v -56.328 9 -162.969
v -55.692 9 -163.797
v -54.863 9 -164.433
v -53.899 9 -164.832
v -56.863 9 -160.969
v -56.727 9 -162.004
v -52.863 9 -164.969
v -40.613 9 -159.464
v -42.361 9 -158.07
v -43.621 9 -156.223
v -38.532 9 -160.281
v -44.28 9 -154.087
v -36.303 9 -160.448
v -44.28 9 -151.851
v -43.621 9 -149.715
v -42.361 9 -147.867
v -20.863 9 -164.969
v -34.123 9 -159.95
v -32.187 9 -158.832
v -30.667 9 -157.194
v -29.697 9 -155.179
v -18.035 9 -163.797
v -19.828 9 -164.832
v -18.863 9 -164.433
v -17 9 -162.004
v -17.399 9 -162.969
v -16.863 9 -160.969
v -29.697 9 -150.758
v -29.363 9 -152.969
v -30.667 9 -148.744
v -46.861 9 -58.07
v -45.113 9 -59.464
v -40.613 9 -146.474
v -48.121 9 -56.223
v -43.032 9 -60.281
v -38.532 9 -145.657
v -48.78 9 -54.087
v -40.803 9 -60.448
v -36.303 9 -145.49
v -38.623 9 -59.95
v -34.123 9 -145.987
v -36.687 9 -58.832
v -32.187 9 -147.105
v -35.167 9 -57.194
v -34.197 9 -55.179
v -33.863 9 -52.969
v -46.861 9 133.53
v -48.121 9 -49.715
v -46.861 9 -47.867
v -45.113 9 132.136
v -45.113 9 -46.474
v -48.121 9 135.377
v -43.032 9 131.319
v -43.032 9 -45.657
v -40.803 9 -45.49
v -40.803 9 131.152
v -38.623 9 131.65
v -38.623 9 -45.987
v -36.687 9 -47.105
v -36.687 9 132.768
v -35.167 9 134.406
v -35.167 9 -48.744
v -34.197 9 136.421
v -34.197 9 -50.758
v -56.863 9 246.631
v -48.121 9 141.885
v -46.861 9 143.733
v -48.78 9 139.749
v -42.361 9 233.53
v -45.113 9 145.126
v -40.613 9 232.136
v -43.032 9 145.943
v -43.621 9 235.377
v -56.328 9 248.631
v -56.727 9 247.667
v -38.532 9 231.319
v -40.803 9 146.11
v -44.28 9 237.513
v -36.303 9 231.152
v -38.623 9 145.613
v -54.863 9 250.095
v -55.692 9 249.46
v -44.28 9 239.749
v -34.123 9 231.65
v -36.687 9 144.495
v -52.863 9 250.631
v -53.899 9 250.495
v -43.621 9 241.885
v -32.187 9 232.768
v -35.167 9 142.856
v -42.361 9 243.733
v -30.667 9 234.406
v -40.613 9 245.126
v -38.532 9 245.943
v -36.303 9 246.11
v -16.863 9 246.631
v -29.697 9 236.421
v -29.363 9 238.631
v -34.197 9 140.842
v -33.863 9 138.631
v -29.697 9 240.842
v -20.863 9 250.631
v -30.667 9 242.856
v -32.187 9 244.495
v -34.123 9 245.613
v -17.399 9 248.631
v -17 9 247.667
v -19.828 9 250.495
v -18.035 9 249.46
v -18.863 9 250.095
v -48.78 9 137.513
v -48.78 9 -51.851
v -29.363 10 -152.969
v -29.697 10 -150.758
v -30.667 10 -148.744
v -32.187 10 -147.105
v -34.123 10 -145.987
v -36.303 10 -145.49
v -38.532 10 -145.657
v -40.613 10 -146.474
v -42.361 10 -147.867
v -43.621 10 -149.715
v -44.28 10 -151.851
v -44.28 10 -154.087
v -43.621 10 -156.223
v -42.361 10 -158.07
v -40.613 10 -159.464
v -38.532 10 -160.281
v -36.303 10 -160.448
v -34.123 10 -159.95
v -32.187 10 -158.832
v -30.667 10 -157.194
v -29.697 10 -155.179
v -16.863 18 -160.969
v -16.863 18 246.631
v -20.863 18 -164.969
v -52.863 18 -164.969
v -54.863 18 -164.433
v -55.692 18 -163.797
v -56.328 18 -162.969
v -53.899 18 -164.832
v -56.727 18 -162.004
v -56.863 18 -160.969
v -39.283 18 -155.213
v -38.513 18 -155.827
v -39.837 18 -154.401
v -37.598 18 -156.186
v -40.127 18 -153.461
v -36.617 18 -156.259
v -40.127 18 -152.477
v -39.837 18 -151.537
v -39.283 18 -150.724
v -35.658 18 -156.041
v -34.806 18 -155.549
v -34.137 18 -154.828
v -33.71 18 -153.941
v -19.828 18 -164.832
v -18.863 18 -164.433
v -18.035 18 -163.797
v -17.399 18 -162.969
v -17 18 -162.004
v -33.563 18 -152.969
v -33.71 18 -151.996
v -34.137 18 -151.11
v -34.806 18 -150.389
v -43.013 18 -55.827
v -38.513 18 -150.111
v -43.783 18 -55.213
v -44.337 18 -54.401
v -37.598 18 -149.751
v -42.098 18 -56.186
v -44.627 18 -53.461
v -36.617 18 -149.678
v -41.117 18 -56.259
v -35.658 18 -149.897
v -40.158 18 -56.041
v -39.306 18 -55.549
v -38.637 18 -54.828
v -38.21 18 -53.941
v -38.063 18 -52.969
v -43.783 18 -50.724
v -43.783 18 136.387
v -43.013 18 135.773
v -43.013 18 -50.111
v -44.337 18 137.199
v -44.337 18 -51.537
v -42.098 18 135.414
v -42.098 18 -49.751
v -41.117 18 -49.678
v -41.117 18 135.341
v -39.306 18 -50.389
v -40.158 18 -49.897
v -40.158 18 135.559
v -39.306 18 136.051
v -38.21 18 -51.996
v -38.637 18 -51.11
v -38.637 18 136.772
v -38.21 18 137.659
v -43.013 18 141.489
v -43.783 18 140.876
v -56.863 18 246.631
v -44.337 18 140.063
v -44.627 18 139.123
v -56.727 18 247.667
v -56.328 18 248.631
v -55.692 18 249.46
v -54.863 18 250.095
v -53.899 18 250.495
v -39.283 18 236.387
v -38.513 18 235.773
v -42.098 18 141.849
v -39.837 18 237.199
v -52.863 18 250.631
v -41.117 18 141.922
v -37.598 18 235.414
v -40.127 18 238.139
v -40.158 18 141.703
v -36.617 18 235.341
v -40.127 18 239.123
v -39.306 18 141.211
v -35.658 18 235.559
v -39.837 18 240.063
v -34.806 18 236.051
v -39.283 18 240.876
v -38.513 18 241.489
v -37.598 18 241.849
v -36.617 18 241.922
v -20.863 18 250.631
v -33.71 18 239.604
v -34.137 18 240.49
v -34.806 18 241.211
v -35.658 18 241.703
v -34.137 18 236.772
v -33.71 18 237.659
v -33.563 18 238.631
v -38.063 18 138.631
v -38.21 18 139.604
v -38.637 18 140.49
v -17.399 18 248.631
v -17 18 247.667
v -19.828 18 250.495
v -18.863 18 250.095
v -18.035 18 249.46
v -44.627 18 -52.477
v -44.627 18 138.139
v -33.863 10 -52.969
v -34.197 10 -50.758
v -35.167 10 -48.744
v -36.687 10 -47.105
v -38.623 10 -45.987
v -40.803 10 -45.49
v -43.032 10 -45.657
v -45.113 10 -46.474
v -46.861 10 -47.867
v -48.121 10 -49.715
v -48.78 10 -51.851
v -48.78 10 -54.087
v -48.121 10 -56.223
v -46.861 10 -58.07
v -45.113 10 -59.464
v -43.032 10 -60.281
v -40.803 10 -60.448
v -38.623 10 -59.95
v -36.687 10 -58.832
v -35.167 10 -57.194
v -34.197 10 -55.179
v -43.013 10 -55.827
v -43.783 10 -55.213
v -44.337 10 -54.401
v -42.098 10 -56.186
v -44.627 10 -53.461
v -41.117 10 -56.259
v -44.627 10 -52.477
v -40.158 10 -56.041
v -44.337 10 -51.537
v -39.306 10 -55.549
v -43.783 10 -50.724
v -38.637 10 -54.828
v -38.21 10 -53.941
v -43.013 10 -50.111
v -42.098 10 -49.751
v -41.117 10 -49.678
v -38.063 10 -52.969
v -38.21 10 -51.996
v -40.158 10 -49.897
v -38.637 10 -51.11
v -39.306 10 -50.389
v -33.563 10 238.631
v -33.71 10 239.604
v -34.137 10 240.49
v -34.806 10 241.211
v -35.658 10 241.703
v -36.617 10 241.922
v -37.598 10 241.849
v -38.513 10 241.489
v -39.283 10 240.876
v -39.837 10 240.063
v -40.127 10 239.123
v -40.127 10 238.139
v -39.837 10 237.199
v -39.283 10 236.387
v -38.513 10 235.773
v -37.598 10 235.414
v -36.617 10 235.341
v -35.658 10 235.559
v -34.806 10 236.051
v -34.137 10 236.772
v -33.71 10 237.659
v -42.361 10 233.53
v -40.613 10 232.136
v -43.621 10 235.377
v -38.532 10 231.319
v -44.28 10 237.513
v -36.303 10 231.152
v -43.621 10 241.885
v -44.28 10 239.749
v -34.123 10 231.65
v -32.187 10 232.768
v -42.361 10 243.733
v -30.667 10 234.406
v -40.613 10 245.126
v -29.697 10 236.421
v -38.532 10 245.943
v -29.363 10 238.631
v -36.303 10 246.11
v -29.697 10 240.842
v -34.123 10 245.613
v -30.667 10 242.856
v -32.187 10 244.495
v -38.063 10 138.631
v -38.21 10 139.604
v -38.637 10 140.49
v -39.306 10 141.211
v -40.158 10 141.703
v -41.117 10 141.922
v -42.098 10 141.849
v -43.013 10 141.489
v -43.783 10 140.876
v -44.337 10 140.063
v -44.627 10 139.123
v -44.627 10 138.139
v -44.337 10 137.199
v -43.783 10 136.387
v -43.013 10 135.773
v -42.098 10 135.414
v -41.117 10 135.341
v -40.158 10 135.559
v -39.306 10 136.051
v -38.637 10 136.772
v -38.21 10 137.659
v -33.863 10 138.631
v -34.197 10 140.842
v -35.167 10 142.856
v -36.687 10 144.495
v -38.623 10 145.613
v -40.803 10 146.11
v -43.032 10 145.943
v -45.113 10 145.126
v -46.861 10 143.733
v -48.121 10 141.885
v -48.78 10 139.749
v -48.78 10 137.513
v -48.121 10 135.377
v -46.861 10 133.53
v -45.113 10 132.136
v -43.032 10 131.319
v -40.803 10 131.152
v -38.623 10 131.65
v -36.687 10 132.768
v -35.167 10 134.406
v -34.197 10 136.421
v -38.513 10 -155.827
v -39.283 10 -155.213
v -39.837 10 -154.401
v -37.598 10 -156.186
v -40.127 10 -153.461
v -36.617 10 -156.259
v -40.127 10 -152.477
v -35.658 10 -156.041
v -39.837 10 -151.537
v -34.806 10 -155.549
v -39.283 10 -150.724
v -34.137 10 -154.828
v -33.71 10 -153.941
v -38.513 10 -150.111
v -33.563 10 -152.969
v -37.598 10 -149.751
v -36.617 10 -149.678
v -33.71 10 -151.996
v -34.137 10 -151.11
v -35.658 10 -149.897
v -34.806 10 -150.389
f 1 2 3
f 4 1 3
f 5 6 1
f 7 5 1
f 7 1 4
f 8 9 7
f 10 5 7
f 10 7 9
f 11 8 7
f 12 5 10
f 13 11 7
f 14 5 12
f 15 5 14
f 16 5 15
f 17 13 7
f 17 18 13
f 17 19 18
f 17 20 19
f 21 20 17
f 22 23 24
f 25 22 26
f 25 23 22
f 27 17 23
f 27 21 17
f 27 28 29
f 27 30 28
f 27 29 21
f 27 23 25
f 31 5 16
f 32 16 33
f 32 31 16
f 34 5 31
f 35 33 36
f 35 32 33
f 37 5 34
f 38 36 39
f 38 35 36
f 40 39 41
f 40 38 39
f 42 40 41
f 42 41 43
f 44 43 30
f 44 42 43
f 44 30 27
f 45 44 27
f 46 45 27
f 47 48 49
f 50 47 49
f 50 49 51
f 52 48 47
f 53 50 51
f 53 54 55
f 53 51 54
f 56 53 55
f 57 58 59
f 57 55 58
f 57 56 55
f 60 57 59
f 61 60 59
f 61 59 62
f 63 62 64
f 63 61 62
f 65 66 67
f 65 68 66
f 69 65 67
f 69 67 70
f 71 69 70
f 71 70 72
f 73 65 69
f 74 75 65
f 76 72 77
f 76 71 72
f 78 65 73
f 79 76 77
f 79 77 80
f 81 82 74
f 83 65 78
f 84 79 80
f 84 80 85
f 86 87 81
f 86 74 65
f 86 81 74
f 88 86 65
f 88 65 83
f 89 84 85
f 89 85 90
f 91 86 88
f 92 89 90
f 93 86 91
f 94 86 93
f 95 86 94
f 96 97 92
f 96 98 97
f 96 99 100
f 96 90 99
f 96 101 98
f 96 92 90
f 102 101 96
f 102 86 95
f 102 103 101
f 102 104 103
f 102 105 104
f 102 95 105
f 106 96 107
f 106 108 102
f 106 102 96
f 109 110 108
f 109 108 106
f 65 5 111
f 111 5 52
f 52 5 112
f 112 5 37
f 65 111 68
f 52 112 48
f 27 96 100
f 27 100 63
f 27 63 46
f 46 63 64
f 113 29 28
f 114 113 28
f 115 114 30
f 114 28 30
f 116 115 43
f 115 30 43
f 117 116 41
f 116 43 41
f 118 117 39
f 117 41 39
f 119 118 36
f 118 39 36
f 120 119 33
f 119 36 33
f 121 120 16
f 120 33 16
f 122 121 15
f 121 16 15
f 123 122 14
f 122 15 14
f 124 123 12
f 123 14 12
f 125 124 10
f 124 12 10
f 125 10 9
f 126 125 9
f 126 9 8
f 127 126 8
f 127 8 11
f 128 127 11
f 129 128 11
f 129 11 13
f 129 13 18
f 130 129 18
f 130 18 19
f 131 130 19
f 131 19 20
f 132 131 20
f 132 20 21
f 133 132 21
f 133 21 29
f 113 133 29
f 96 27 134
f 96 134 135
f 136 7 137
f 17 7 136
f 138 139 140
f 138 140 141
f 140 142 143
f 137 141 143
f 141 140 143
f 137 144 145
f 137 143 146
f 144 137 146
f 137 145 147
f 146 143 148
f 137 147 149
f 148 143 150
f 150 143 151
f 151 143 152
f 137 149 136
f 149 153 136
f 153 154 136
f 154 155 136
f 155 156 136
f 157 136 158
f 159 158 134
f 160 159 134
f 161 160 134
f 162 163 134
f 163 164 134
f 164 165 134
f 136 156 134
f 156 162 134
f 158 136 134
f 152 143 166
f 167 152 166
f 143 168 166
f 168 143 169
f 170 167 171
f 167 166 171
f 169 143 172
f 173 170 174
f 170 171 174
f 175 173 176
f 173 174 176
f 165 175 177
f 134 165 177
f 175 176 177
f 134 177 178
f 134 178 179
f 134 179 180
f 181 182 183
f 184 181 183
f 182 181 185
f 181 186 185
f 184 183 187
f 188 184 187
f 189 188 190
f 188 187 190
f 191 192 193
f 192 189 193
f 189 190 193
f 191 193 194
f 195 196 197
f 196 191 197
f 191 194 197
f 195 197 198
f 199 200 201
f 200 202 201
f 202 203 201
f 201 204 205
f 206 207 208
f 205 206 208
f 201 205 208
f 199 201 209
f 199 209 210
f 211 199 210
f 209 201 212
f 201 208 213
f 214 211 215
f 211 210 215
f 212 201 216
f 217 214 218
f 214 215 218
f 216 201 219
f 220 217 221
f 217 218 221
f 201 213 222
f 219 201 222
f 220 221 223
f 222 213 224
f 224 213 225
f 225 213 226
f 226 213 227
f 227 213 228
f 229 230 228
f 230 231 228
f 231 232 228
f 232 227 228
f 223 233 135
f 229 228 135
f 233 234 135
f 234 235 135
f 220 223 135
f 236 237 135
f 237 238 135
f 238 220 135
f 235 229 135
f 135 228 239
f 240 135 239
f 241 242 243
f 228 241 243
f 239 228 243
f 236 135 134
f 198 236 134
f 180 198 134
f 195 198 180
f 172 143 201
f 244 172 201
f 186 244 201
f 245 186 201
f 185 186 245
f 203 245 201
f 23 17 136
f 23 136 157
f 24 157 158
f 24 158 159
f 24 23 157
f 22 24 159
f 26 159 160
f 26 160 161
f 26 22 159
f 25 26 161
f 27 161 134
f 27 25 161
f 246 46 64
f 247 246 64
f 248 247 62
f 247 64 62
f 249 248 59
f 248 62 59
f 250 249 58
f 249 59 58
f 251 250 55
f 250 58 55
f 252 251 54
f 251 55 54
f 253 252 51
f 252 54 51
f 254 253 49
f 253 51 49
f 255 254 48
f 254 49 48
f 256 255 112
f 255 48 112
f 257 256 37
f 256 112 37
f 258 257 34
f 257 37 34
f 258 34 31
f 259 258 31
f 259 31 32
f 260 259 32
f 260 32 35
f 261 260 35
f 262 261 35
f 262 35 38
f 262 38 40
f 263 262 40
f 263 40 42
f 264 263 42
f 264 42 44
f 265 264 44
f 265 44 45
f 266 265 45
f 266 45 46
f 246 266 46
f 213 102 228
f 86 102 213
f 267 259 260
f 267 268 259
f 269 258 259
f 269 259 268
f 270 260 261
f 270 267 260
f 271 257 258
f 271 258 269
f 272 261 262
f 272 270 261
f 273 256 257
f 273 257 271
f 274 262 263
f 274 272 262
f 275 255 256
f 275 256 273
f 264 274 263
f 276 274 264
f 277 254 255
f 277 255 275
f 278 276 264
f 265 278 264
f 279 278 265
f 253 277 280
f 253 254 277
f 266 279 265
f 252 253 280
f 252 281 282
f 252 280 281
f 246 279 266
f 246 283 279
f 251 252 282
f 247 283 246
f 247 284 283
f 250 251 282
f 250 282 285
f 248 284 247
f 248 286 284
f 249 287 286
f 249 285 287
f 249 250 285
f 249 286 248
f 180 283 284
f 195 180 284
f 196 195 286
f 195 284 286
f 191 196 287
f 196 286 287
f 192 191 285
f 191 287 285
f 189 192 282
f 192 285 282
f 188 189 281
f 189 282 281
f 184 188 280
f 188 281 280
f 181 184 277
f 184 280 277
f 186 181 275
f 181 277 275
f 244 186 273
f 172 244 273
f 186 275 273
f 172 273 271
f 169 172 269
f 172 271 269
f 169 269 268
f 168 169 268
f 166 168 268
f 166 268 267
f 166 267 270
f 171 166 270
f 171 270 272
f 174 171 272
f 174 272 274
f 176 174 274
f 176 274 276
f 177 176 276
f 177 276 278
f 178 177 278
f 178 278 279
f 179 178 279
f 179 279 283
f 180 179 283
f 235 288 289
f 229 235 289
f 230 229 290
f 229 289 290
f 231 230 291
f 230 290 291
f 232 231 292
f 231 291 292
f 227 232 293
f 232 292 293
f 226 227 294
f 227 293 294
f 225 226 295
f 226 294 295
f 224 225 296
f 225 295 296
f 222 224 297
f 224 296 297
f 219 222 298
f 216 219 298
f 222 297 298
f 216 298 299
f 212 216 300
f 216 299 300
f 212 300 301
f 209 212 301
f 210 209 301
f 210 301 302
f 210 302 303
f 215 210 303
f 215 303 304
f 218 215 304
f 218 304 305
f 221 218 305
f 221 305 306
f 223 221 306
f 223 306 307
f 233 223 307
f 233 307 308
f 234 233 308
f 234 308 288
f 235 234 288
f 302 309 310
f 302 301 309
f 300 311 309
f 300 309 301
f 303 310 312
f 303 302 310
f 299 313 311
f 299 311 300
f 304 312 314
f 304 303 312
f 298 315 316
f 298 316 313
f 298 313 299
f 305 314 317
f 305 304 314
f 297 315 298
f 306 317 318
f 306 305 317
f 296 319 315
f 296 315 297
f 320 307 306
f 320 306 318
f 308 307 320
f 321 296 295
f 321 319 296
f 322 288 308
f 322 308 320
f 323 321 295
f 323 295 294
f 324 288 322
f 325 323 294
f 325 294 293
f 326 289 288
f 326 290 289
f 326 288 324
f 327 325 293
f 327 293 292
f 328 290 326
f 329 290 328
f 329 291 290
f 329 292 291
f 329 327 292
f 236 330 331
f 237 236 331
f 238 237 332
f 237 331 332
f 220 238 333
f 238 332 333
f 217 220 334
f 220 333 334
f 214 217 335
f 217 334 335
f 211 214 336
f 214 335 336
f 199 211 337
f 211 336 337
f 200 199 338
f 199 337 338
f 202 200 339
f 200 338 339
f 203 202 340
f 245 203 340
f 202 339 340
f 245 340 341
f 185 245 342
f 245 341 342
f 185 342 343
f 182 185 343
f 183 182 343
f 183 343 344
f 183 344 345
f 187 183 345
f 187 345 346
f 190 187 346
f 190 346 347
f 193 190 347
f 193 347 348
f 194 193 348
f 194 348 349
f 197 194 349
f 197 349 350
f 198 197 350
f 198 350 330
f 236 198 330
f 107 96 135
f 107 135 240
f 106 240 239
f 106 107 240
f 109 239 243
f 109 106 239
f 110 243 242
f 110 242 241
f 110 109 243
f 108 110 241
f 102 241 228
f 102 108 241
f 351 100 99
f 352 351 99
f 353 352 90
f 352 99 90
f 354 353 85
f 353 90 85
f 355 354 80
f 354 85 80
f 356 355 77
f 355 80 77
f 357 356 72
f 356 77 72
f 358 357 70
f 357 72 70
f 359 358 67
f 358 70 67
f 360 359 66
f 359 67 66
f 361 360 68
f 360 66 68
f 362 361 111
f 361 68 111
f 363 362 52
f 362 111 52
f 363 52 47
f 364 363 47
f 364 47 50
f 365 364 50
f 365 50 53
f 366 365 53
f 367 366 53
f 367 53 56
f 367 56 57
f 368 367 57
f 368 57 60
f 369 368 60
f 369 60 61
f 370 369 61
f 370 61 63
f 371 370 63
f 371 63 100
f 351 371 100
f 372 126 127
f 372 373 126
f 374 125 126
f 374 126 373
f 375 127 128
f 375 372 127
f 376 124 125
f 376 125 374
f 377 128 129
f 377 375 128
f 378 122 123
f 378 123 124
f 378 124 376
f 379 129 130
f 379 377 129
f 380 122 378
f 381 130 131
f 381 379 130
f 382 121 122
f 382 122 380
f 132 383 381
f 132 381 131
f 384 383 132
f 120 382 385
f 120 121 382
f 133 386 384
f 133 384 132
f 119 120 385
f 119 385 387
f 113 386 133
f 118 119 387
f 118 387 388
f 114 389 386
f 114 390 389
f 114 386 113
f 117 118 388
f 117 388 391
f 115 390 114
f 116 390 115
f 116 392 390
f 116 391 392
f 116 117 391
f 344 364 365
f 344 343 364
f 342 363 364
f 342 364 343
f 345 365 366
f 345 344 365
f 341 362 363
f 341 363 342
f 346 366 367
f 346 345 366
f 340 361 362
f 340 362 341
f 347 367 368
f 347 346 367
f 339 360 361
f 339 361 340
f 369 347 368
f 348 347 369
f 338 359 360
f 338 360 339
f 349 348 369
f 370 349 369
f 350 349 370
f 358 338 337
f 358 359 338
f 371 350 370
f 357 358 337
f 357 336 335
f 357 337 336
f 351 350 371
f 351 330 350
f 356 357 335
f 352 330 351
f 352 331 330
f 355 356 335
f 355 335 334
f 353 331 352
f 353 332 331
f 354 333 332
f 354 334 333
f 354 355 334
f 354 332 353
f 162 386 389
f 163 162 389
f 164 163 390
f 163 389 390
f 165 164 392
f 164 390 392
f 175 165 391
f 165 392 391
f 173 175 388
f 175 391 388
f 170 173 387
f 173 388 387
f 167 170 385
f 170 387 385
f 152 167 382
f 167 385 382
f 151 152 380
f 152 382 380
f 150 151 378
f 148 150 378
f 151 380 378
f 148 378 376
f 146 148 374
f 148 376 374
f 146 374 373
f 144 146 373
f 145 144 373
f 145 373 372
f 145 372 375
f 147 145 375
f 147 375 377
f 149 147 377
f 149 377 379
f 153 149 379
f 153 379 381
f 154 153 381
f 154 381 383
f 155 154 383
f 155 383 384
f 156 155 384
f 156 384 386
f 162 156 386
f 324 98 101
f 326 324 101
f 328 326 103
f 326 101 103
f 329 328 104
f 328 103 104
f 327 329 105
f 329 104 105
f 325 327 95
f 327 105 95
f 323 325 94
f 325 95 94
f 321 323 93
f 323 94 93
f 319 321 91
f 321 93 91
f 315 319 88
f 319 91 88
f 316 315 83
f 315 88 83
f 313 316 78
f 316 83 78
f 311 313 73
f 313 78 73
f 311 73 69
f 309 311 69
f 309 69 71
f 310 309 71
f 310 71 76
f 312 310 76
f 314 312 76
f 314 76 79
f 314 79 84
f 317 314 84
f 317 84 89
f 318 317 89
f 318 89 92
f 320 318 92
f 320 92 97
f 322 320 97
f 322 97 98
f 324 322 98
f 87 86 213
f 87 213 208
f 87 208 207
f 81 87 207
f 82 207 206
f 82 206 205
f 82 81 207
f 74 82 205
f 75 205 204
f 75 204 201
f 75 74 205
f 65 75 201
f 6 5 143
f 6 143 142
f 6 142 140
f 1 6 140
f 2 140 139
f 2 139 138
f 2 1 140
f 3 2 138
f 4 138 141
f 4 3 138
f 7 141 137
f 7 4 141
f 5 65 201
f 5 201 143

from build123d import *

# Parameters (mm, degrees)
F0_R     = 7.5
F0_R_2   = 3.3
F1_DEPTH = 18
F2_DEPTH = 9
F3_DEPTH = 10


with BuildPart() as f1:
    # F0 (on Front) → F1 (new body)
    with BuildSketch(Plane.XZ):
        with BuildLine():
            ThreePointArc((-56.863438, -160.968715), (-55.691865, -163.797142), (-52.863438, -164.968715))
            Line((-52.863438, -164.968715), (-20.863438, -164.968715))
            ThreePointArc((-20.863438, -164.968715), (-18.035011, -163.797142), (-16.863438, -160.968715))
            Line((-16.863438, -160.968715), (-16.863438, 246.631285))
            ThreePointArc((-16.863438, 246.631285), (-18.035011, 249.459712), (-20.863438, 250.631285))
            Line((-20.863438, 250.631285), (-52.863438, 250.631285))
            ThreePointArc((-52.863438, 250.631285), (-55.691865, 249.459712), (-56.863438, 246.631285))
            Line((-56.863438, 246.631285), (-56.863438, -160.968715))
        make_face()
        with Locations((-36.863438, -152.968715)):
            Circle(F0_R, mode=Mode.SUBTRACT)
        with Locations((-41.363438, -52.968715)):
            Circle(F0_R, mode=Mode.SUBTRACT)
        with Locations((-41.363438, 138.631285)):
            Circle(F0_R, mode=Mode.SUBTRACT)
        with Locations((-36.863438, 238.631285)):
            Circle(F0_R, mode=Mode.SUBTRACT)
        with Locations((-36.863438, 238.631285)):
            Circle(F0_R)
        with Locations((-36.863438, 238.631285)):
            Circle(F0_R_2, mode=Mode.SUBTRACT)
        with Locations((-41.363438, 138.631285)):
            Circle(F0_R)
        with Locations((-41.363438, 138.631285)):
            Circle(F0_R_2, mode=Mode.SUBTRACT)
        with Locations((-41.363438, -52.968715)):
            Circle(F0_R)
        with Locations((-41.363438, -52.968715)):
            Circle(F0_R_2, mode=Mode.SUBTRACT)
        with Locations((-36.863438, -152.968715)):
            Circle(F0_R)
        with Locations((-36.863438, -152.968715)):
            Circle(F0_R_2, mode=Mode.SUBTRACT)
    extrude(amount=-F1_DEPTH)

    # F0 (on Front) → F2 (cut)
    with BuildSketch(Plane.XZ):
        with BuildLine():
            Line((-6.144915, -161.370628), (-6.144915, 246.229372))
            ThreePointArc((-6.144915, 246.229372), (-10.24542, 256.128867), (-20.144915, 260.229372))
            Line((-20.144915, 260.229372), (-52.144915, 260.229372))
            ThreePointArc((-52.144915, 260.229372), (-62.04441, 256.128867), (-66.144915, 246.229372))
            Line((-66.144915, 246.229372), (-66.144915, -161.370628))
            ThreePointArc((-66.144915, -161.370628), (-62.04441, -171.270123), (-52.144915, -175.370628))
            Line((-52.144915, -175.370628), (-20.144915, -175.370628))
            ThreePointArc((-20.144915, -175.370628), (-10.24542, -171.270123), (-6.144915, -161.370628))
        make_face()
        with BuildLine():
            Line((-20.863438, -164.968715), (-52.863438, -164.968715))
            ThreePointArc((-52.863438, -164.968715), (-55.691865, -163.797142), (-56.863438, -160.968715))
            Line((-56.863438, -160.968715), (-56.863438, 246.631285))
            ThreePointArc((-56.863438, 246.631285), (-55.691865, 249.459712), (-52.863438, 250.631285))
            Line((-52.863438, 250.631285), (-20.863438, 250.631285))
            ThreePointArc((-20.863438, 250.631285), (-18.035011, 249.459712), (-16.863438, 246.631285))
            Line((-16.863438, 246.631285), (-16.863438, -160.968715))
            ThreePointArc((-16.863438, -160.968715), (-18.035011, -163.797142), (-20.863438, -164.968715))
        make_face(mode=Mode.SUBTRACT)
        with Locations((-36.863438, 238.631285)):
            Circle(F0_R_2)
        with Locations((-41.363438, 138.631285)):
            Circle(F0_R)
        with Locations((-41.363438, 138.631285)):
            Circle(F0_R_2, mode=Mode.SUBTRACT)
        with Locations((-41.363438, 138.631285)):
            Circle(F0_R_2)
        with Locations((-41.363438, -52.968715)):
            Circle(F0_R)
        with Locations((-41.363438, -52.968715)):
            Circle(F0_R_2, mode=Mode.SUBTRACT)
        with Locations((-41.363438, -52.968715)):
            Circle(F0_R_2)
        with Locations((-36.863438, 238.631285)):
            Circle(F0_R)
        with Locations((-36.863438, 238.631285)):
            Circle(F0_R_2, mode=Mode.SUBTRACT)
        with BuildLine():
            ThreePointArc((-56.863438, -160.968715), (-55.691865, -163.797142), (-52.863438, -164.968715))
            Line((-52.863438, -164.968715), (-20.863438, -164.968715))
            ThreePointArc((-20.863438, -164.968715), (-18.035011, -163.797142), (-16.863438, -160.968715))
            Line((-16.863438, -160.968715), (-16.863438, 246.631285))
            ThreePointArc((-16.863438, 246.631285), (-18.035011, 249.459712), (-20.863438, 250.631285))
            Line((-20.863438, 250.631285), (-52.863438, 250.631285))
            ThreePointArc((-52.863438, 250.631285), (-55.691865, 249.459712), (-56.863438, 246.631285))
            Line((-56.863438, 246.631285), (-56.863438, -160.968715))
        make_face()
        with Locations((-36.863438, -152.968715)):
            Circle(F0_R, mode=Mode.SUBTRACT)
        with Locations((-41.363438, -52.968715)):
            Circle(F0_R, mode=Mode.SUBTRACT)
        with Locations((-41.363438, 138.631285)):
            Circle(F0_R, mode=Mode.SUBTRACT)
        with Locations((-36.863438, 238.631285)):
            Circle(F0_R, mode=Mode.SUBTRACT)
        with Locations((-36.863438, -152.968715)):
            Circle(F0_R)
        with Locations((-36.863438, -152.968715)):
            Circle(F0_R_2, mode=Mode.SUBTRACT)
        with Locations((-36.863438, -152.968715)):
            Circle(F0_R_2)
    extrude(amount=-F2_DEPTH, mode=Mode.SUBTRACT)

    # F0 (on Front) → F3 (cut)
    with BuildSketch(Plane.XZ):
        with Locations((-36.863438, 238.631285)):
            Circle(F0_R)
        with Locations((-36.863438, 238.631285)):
            Circle(F0_R_2, mode=Mode.SUBTRACT)
        with Locations((-41.363438, 138.631285)):
            Circle(F0_R)
        with Locations((-41.363438, 138.631285)):
            Circle(F0_R_2, mode=Mode.SUBTRACT)
        with Locations((-41.363438, -52.968715)):
            Circle(F0_R)
        with Locations((-41.363438, -52.968715)):
            Circle(F0_R_2, mode=Mode.SUBTRACT)
        with Locations((-36.863438, -152.968715)):
            Circle(F0_R)
        with Locations((-36.863438, -152.968715)):
            Circle(F0_R_2, mode=Mode.SUBTRACT)
    extrude(amount=-F3_DEPTH, mode=Mode.SUBTRACT)


solid = f1.part
